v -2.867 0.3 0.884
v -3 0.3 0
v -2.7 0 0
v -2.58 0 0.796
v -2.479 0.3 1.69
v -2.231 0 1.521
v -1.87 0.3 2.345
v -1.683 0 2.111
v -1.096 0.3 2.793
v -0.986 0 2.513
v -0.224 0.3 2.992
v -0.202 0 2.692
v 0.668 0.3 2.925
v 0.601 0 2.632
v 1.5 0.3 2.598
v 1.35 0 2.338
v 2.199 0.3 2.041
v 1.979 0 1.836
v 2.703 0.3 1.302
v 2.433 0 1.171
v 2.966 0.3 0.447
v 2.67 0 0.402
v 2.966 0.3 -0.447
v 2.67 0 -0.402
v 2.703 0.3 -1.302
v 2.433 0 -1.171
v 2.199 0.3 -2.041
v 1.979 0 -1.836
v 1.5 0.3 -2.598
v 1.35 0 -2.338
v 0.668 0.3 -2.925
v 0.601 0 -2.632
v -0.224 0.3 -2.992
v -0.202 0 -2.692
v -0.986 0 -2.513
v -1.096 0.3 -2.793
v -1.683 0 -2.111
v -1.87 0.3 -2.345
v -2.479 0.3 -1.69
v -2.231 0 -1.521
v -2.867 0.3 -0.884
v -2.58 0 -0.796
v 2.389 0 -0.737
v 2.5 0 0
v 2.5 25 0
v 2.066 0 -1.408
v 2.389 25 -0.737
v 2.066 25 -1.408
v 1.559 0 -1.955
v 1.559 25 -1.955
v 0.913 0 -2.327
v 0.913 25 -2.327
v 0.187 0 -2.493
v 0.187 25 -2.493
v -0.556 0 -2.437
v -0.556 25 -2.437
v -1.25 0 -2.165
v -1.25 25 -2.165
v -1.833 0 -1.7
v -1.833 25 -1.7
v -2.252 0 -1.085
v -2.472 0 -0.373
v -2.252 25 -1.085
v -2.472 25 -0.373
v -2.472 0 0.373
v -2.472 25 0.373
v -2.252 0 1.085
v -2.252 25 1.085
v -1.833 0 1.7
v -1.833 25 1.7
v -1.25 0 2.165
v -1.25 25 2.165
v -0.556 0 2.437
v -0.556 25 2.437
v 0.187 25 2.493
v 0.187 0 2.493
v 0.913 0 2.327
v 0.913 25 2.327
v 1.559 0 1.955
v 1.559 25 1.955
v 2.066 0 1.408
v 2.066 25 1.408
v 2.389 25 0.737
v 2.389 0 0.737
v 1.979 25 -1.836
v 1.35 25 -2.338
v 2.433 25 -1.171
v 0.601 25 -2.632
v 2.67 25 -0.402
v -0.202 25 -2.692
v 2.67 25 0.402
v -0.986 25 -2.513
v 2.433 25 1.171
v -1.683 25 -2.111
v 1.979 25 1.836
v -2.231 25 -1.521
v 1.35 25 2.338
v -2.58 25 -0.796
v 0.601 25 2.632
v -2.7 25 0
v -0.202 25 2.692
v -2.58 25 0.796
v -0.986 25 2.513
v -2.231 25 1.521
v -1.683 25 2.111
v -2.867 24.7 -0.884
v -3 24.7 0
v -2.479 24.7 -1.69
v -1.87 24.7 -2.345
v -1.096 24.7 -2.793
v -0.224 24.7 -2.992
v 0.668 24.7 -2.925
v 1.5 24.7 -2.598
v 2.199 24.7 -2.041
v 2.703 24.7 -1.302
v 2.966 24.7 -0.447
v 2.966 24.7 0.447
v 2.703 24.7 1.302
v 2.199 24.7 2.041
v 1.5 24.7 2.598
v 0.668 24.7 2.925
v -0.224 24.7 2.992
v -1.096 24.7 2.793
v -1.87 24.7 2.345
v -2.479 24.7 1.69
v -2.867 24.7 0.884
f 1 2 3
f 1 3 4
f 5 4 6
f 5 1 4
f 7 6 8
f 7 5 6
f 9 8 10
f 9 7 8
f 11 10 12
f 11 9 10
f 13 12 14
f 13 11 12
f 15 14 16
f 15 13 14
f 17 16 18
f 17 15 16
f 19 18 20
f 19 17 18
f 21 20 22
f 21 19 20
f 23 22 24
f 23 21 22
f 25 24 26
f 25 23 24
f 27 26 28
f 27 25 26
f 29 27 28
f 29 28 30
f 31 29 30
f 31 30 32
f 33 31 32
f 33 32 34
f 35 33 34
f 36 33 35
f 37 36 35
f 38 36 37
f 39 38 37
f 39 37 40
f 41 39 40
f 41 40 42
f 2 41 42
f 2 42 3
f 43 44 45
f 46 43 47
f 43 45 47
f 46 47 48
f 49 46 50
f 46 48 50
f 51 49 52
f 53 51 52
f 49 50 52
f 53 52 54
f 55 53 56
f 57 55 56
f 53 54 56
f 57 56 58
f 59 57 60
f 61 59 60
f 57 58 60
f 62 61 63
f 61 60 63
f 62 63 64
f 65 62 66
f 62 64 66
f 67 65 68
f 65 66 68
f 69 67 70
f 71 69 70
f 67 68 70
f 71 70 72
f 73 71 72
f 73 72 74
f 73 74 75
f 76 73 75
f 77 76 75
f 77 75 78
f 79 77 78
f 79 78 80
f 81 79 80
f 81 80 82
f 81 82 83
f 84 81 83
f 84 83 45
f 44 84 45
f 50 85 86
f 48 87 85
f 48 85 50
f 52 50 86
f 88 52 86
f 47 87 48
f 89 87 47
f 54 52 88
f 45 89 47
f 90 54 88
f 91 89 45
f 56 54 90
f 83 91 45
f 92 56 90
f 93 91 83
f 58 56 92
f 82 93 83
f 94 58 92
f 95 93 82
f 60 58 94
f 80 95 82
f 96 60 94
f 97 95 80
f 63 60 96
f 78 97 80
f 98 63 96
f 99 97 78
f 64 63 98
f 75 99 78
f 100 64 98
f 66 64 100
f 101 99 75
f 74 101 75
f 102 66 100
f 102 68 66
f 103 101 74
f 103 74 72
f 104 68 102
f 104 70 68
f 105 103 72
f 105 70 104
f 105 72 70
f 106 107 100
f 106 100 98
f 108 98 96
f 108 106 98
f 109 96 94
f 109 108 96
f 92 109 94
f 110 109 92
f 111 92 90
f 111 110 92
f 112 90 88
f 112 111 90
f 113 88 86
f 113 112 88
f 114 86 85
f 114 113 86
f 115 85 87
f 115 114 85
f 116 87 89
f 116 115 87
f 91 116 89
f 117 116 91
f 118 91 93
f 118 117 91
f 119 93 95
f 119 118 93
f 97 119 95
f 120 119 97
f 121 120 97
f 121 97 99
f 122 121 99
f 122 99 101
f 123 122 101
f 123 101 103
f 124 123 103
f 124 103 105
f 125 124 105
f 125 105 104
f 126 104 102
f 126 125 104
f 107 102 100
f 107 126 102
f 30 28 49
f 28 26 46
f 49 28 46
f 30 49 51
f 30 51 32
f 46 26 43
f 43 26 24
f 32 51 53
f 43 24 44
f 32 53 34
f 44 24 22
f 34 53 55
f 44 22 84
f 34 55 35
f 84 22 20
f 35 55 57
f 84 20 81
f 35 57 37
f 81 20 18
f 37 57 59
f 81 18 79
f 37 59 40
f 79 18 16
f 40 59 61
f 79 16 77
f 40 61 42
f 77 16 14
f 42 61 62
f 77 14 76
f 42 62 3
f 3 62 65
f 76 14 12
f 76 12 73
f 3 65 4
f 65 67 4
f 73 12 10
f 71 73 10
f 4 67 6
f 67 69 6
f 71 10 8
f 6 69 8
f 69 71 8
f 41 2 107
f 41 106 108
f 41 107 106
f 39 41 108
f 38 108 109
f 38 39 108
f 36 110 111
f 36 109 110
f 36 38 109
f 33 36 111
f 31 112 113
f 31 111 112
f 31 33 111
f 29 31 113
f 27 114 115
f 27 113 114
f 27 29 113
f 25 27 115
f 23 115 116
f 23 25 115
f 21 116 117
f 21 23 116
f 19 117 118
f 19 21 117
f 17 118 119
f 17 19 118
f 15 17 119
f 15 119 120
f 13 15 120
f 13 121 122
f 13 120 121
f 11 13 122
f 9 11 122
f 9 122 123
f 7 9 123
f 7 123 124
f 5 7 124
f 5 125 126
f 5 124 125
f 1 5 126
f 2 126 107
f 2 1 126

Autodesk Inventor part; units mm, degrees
ref_plane "YZ Plane" through (0, 0, 0) normal (1, 0, 0) x (0, 1, 0)
ref_plane "XZ Plane" through (0, 0, 0) normal (0, 1, 0) x (-1, 0, 0)
ref_plane "XY Plane" through (0, 0, 0) normal (0, 0, 1) x (1, 0, 0)
sketch "Sketch1" plane through (0, 0, 0) normal (0, 1, 0) x (-1, 0, 0)
  circle A0 centre (0, 0) radius 3
  circle A1 centre (0, 0) radius 2.75
  dimension "d0" = 6
  dimension "d1" = 5.5
extrude "Extrusion1" add sketch "Sketch1" along normal blind 25 contours A0 | A1
chamfer "Chamfer1" distance 0.3 angle 45 2 edges at (3, 25, 0) (3, 0, 0) measured on face at (-2.9612, 8.3333, -0.4812)
sketch "Sketch2" plane through (0, 25, 0) normal (0, 1, 0) x (1, 0, 0)
  circle A0 centre (0, 0) radius 2.5
  dimension "d7" = 5
extrude "Extrusion2" cut sketch "Sketch2" against normal blind 50
properties part number "26-10-211"
